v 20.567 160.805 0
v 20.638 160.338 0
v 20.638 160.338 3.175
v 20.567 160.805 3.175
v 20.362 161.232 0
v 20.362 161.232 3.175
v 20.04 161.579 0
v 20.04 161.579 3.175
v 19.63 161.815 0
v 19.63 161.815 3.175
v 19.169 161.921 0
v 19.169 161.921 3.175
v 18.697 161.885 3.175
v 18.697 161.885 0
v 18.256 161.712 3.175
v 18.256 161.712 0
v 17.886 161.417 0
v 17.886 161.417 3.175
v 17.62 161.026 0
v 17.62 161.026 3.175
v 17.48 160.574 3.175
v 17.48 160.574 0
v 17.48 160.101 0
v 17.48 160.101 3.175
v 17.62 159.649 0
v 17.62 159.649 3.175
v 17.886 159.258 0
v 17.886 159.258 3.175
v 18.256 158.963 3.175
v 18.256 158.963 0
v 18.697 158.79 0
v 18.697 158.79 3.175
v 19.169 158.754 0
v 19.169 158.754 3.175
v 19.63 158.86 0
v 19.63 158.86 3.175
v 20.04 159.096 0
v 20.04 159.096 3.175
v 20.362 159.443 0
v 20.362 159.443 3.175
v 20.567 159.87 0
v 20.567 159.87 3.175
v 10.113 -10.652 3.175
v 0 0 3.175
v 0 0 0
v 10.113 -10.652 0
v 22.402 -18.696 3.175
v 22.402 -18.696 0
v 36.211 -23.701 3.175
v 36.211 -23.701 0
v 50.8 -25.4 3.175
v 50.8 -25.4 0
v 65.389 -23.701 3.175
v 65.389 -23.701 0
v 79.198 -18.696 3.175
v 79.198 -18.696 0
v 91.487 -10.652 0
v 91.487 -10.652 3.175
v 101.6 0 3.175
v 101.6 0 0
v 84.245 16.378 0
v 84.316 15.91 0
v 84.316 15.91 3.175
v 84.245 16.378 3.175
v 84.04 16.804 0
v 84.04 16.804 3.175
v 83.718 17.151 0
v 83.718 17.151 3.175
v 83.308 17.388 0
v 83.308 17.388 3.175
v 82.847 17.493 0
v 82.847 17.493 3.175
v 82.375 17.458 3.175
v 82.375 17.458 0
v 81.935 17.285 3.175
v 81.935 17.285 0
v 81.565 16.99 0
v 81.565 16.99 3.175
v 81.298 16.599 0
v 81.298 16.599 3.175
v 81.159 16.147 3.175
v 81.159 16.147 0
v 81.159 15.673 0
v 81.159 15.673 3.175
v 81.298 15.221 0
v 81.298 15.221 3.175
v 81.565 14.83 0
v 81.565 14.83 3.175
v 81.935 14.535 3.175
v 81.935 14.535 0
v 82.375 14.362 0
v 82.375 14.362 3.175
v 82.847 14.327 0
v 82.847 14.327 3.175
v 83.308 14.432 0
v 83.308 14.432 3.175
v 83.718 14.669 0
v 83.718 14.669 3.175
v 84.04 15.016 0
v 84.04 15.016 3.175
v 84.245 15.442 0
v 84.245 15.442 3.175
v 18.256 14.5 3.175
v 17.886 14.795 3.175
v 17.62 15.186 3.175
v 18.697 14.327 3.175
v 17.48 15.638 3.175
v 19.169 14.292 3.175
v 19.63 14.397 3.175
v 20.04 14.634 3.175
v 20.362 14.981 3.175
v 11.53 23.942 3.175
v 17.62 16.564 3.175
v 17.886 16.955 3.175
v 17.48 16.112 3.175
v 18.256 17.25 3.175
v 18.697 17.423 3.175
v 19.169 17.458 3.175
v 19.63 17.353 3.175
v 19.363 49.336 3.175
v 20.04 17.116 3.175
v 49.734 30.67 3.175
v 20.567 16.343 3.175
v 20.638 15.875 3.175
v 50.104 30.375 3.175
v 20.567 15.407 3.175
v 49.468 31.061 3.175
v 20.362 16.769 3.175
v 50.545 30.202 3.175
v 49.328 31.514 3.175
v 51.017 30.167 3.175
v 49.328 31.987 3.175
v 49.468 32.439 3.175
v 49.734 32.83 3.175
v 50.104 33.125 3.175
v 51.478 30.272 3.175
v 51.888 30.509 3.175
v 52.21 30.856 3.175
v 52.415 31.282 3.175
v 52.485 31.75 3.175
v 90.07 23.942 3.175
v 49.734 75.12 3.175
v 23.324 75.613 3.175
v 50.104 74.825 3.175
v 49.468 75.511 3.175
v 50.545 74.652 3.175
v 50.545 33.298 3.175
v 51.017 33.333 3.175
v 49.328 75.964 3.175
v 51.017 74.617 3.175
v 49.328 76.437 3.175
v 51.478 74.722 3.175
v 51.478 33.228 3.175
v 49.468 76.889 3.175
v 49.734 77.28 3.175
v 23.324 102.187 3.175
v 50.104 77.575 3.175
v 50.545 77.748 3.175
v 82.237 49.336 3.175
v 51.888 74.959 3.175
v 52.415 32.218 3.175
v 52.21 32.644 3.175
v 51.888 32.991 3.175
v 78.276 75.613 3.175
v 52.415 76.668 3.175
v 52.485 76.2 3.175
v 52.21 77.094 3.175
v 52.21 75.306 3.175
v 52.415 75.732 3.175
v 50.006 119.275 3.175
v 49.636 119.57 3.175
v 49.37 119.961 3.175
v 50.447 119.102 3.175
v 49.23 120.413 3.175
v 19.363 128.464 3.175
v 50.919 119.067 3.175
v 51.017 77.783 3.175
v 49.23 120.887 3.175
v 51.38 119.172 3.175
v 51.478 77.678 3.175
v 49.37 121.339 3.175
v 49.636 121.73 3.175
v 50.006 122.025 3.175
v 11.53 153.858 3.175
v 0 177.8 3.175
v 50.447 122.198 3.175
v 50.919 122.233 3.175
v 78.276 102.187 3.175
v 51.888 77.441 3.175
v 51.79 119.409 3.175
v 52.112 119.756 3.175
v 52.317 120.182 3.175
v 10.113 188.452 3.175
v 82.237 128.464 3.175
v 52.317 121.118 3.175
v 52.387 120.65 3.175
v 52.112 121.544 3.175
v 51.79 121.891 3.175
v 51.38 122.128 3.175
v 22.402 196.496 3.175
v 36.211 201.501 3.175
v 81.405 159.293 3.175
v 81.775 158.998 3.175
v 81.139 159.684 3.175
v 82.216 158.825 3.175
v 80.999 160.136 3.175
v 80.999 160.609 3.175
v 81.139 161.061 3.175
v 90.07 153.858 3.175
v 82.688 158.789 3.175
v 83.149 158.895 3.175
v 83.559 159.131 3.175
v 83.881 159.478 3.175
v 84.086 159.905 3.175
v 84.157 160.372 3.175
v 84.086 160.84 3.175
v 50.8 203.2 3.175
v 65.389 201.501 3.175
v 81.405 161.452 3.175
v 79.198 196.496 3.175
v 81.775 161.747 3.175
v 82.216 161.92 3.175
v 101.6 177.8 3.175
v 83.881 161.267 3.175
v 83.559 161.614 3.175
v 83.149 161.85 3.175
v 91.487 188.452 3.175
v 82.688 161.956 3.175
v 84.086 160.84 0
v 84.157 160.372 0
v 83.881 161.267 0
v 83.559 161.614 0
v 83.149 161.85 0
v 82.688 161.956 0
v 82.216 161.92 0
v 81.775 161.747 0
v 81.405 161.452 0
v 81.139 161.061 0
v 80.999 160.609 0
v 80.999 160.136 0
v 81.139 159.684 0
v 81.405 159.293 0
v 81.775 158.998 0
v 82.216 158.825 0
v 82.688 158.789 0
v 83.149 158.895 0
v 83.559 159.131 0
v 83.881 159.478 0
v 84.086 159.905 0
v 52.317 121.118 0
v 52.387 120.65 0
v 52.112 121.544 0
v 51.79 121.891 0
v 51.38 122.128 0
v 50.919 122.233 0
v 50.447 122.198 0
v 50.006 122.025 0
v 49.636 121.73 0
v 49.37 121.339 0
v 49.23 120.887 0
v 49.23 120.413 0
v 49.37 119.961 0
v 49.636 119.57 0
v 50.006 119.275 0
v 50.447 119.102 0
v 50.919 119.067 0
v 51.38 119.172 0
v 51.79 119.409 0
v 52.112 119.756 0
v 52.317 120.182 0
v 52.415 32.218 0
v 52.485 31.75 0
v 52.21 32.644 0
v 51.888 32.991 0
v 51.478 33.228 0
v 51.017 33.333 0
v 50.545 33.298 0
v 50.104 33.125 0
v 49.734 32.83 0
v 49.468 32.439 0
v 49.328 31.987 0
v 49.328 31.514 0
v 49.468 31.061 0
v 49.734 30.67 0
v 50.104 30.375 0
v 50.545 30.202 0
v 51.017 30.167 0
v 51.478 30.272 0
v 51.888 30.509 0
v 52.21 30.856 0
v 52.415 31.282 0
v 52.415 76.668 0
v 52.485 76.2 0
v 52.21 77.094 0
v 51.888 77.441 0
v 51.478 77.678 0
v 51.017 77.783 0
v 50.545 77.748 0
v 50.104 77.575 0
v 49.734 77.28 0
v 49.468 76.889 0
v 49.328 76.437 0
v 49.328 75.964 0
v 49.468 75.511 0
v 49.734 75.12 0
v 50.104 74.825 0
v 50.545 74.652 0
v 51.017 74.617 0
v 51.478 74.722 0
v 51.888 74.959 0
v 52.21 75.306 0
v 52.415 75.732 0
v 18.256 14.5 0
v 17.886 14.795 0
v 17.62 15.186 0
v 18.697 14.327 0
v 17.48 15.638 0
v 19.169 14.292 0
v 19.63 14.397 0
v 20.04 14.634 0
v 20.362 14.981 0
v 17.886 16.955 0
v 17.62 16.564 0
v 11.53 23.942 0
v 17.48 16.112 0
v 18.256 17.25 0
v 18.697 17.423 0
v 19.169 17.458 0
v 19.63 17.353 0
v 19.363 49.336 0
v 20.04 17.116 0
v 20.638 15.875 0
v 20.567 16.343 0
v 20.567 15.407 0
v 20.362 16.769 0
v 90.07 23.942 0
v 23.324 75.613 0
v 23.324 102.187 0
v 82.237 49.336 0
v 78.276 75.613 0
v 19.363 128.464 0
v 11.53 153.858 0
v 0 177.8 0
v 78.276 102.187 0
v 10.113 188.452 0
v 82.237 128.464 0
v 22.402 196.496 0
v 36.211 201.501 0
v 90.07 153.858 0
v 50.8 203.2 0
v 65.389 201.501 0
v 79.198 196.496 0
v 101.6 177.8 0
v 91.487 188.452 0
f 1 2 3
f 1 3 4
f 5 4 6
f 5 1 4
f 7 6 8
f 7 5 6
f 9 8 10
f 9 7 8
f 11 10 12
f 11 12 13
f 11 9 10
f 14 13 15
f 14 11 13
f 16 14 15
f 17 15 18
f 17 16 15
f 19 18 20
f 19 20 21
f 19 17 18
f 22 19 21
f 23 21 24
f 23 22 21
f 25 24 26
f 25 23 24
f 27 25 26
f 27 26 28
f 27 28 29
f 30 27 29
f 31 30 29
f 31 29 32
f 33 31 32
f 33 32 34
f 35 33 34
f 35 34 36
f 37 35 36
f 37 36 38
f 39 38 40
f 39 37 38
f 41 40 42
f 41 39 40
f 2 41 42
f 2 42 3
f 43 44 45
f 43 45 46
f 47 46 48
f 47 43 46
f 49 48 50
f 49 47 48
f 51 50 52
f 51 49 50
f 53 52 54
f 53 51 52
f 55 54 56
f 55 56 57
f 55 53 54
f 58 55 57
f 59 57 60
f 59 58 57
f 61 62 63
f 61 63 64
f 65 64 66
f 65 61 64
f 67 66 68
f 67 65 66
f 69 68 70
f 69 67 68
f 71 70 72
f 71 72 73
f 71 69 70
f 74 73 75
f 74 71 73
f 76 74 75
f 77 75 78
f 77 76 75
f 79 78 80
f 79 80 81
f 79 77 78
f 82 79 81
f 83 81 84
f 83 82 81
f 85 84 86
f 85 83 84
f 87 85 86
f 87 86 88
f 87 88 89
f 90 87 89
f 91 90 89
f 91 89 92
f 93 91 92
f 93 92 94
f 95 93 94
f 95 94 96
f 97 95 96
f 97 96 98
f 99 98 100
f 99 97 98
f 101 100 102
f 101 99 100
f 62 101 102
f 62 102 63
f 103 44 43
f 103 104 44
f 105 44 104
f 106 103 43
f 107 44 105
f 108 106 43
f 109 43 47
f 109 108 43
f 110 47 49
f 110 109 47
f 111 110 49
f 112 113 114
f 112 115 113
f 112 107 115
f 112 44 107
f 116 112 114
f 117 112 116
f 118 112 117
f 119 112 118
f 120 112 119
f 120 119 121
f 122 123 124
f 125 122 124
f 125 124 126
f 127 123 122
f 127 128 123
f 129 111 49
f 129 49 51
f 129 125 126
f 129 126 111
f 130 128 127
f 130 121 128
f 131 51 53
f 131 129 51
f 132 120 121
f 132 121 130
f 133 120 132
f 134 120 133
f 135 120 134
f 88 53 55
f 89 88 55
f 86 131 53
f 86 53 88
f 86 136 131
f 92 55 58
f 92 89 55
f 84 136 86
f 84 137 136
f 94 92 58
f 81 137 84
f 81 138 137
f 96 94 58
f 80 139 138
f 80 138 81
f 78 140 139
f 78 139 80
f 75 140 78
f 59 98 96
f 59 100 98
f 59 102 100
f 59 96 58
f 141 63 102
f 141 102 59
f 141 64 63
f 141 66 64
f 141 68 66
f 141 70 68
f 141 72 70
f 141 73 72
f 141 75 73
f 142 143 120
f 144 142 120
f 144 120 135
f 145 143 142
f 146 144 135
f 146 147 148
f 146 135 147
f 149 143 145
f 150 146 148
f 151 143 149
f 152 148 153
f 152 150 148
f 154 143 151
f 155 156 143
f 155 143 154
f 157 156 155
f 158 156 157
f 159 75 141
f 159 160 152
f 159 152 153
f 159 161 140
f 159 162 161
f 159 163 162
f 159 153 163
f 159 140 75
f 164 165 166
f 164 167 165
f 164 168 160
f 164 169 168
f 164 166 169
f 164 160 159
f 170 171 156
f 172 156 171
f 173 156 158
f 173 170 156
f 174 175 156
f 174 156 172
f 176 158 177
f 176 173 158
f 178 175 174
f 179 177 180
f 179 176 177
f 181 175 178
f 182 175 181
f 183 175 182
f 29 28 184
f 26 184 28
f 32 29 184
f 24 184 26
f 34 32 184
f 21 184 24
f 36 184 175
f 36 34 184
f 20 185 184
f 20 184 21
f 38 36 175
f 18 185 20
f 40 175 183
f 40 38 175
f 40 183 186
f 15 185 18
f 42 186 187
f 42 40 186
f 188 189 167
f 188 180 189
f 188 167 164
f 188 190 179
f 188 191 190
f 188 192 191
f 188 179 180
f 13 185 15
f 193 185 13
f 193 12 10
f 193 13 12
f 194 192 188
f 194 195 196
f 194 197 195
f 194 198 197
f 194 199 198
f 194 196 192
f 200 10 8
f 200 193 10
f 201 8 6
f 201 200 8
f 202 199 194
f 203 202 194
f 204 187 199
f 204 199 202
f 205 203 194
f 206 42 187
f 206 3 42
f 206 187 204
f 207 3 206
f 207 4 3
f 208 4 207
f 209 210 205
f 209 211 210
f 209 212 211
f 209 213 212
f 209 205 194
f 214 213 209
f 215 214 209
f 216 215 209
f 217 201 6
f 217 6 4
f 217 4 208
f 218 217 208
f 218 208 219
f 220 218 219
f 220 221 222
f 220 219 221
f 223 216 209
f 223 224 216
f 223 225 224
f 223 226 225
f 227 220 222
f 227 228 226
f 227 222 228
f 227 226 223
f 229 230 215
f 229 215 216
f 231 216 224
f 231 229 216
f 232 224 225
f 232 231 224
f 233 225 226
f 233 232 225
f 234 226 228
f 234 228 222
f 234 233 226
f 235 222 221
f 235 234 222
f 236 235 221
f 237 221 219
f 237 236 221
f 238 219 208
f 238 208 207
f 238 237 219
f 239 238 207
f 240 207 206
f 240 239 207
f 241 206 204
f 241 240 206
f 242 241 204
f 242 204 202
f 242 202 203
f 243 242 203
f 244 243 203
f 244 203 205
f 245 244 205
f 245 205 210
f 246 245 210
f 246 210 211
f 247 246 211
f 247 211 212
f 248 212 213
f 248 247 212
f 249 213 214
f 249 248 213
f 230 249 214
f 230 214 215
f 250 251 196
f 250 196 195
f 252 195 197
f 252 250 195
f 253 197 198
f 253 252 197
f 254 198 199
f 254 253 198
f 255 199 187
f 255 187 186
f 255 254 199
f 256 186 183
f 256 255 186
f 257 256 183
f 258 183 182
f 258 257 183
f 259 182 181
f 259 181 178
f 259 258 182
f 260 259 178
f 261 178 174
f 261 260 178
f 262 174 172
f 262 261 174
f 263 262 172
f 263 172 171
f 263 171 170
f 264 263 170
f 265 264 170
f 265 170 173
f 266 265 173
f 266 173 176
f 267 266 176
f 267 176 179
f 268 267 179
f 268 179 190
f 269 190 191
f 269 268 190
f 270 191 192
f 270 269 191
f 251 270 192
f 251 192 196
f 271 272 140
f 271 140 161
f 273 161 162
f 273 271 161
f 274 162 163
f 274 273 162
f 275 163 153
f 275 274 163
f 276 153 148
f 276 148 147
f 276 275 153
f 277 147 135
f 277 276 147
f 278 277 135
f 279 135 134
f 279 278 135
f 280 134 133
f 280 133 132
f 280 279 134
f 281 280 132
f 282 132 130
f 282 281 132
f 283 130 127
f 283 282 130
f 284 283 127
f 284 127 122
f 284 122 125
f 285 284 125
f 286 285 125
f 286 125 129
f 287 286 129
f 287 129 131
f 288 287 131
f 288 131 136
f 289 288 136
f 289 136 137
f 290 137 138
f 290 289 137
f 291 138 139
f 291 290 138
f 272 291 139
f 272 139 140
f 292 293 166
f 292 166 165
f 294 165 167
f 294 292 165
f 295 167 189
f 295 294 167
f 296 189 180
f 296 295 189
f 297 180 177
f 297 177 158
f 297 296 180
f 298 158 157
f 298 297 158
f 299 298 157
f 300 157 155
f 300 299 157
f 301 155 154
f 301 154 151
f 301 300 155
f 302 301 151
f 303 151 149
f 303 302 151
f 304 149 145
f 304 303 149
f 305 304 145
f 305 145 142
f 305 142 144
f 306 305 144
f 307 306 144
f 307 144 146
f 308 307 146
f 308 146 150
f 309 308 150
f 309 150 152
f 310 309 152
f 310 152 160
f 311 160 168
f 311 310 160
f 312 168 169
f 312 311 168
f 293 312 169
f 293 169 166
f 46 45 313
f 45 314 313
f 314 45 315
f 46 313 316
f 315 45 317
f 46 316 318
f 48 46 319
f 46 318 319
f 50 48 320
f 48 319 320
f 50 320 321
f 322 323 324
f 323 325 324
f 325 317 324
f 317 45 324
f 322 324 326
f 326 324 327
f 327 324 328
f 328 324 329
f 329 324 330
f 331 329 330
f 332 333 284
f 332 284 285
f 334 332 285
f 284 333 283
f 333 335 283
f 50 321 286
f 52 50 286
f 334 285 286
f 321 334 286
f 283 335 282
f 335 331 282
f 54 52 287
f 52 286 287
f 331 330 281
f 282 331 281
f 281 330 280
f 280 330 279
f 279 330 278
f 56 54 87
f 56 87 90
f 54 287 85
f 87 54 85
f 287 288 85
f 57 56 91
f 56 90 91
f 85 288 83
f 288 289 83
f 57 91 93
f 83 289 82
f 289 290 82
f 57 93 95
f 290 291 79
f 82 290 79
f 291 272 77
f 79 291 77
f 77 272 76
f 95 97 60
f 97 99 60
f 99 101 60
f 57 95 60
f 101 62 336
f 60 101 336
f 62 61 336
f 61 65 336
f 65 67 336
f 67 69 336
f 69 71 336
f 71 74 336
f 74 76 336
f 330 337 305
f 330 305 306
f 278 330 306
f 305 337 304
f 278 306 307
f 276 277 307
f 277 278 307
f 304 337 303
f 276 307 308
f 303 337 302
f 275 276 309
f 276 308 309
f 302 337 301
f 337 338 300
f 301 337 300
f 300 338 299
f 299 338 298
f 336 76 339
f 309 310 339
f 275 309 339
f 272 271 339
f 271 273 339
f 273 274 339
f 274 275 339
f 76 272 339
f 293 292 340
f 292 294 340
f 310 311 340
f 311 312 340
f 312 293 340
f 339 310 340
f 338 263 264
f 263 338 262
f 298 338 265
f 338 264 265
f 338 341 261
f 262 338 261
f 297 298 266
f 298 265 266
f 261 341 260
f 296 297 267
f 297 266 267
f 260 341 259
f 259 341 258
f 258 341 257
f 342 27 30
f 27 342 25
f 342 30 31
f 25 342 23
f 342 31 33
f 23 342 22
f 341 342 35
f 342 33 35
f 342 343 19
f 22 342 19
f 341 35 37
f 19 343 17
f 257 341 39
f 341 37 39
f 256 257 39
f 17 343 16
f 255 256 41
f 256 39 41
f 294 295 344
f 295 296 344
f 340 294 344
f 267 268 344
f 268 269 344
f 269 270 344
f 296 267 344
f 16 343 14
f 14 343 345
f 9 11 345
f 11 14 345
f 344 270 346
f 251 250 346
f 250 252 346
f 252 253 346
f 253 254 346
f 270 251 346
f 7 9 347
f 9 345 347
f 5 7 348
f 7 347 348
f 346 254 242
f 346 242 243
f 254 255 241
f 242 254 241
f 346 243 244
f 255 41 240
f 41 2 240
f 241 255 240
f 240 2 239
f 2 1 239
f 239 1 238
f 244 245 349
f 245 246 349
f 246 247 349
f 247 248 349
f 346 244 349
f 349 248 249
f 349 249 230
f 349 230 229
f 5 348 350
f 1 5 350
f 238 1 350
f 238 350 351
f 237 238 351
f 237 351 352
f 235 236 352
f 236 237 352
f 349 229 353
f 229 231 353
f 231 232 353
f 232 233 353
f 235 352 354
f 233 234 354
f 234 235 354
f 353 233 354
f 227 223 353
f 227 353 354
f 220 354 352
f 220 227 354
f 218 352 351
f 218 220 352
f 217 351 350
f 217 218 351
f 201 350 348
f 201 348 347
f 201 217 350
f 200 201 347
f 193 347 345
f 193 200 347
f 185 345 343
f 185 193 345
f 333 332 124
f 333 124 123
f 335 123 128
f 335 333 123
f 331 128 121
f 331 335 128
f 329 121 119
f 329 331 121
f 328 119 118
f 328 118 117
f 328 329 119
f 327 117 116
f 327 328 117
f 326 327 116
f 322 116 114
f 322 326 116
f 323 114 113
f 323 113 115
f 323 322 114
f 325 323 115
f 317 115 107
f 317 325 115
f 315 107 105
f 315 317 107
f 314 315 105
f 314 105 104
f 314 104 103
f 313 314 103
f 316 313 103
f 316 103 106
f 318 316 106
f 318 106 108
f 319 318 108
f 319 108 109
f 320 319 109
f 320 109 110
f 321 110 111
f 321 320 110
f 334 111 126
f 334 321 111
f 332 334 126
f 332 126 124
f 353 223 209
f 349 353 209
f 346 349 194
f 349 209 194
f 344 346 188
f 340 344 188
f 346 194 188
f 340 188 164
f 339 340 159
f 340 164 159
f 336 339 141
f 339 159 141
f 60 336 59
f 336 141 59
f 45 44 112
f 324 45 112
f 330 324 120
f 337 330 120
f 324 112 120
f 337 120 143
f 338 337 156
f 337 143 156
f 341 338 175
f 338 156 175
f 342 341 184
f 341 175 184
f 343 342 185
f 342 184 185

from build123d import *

# Parameters (mm, degrees)
F0_W     = 101.6
F0_H     = 177.8
F0_R     = 1.5875
F1_DEPTH = 3.175
F3_DEPTH = 25.4
F5_DEPTH = 3.175


with BuildPart() as f1:
    # F0 (on Top) → F1 (new body)
    with BuildSketch(Plane.XY):
        with Locations((50.8, 88.9)):
            Rectangle(F0_W, F0_H)
        with Locations((19.05, 15.875)):
            Circle(F0_R, mode=Mode.SUBTRACT)
        with Locations((50.897908, 31.750108)):
            Circle(F0_R, mode=Mode.SUBTRACT)
        with Locations((82.728313, 15.910065)):
            Circle(F0_R, mode=Mode.SUBTRACT)
        with Locations((50.897908, 76.200108)):
            Circle(F0_R, mode=Mode.SUBTRACT)
        with Locations((50.8, 120.65)):
            Circle(F0_R, mode=Mode.SUBTRACT)
        with Locations((19.05, 160.3375)):
            Circle(F0_R, mode=Mode.SUBTRACT)
        with Locations((82.569213, 160.372478)):
            Circle(F0_R, mode=Mode.SUBTRACT)
    extrude(amount=F1_DEPTH)

    # F2 (on face) → F3 (cut)
    with BuildSketch(Plane.XY.offset(3.175)):
        with BuildLine():
            Line((101.6, 0), (101.6, 177.8))
            ThreePointArc((101.6, 177.8), (77.779317, 88.9), (101.6, 0))
        make_face()
        with BuildLine():
            ThreePointArc((0, 0), (23.820683, 88.9), (0, 177.8))
            Line((0, 177.8), (0, 0))
        make_face()
    extrude(amount=-F3_DEPTH, mode=Mode.SUBTRACT)

    # F4 (on face) → F5 (join, through all)
    with BuildSketch(Plane.XY.offset(3.175)):
        with BuildLine():
            Line((0, 177.8), (101.6, 177.8))
            ThreePointArc((101.6, 177.8), (50.8, 203.2), (0, 177.8))
        make_face()
        with BuildLine():
            ThreePointArc((0, 0), (50.8, -25.4), (101.6, 0))
            Line((101.6, 0), (0, 0))
        make_face()
    extrude(amount=-F5_DEPTH)


solid = f1.part
